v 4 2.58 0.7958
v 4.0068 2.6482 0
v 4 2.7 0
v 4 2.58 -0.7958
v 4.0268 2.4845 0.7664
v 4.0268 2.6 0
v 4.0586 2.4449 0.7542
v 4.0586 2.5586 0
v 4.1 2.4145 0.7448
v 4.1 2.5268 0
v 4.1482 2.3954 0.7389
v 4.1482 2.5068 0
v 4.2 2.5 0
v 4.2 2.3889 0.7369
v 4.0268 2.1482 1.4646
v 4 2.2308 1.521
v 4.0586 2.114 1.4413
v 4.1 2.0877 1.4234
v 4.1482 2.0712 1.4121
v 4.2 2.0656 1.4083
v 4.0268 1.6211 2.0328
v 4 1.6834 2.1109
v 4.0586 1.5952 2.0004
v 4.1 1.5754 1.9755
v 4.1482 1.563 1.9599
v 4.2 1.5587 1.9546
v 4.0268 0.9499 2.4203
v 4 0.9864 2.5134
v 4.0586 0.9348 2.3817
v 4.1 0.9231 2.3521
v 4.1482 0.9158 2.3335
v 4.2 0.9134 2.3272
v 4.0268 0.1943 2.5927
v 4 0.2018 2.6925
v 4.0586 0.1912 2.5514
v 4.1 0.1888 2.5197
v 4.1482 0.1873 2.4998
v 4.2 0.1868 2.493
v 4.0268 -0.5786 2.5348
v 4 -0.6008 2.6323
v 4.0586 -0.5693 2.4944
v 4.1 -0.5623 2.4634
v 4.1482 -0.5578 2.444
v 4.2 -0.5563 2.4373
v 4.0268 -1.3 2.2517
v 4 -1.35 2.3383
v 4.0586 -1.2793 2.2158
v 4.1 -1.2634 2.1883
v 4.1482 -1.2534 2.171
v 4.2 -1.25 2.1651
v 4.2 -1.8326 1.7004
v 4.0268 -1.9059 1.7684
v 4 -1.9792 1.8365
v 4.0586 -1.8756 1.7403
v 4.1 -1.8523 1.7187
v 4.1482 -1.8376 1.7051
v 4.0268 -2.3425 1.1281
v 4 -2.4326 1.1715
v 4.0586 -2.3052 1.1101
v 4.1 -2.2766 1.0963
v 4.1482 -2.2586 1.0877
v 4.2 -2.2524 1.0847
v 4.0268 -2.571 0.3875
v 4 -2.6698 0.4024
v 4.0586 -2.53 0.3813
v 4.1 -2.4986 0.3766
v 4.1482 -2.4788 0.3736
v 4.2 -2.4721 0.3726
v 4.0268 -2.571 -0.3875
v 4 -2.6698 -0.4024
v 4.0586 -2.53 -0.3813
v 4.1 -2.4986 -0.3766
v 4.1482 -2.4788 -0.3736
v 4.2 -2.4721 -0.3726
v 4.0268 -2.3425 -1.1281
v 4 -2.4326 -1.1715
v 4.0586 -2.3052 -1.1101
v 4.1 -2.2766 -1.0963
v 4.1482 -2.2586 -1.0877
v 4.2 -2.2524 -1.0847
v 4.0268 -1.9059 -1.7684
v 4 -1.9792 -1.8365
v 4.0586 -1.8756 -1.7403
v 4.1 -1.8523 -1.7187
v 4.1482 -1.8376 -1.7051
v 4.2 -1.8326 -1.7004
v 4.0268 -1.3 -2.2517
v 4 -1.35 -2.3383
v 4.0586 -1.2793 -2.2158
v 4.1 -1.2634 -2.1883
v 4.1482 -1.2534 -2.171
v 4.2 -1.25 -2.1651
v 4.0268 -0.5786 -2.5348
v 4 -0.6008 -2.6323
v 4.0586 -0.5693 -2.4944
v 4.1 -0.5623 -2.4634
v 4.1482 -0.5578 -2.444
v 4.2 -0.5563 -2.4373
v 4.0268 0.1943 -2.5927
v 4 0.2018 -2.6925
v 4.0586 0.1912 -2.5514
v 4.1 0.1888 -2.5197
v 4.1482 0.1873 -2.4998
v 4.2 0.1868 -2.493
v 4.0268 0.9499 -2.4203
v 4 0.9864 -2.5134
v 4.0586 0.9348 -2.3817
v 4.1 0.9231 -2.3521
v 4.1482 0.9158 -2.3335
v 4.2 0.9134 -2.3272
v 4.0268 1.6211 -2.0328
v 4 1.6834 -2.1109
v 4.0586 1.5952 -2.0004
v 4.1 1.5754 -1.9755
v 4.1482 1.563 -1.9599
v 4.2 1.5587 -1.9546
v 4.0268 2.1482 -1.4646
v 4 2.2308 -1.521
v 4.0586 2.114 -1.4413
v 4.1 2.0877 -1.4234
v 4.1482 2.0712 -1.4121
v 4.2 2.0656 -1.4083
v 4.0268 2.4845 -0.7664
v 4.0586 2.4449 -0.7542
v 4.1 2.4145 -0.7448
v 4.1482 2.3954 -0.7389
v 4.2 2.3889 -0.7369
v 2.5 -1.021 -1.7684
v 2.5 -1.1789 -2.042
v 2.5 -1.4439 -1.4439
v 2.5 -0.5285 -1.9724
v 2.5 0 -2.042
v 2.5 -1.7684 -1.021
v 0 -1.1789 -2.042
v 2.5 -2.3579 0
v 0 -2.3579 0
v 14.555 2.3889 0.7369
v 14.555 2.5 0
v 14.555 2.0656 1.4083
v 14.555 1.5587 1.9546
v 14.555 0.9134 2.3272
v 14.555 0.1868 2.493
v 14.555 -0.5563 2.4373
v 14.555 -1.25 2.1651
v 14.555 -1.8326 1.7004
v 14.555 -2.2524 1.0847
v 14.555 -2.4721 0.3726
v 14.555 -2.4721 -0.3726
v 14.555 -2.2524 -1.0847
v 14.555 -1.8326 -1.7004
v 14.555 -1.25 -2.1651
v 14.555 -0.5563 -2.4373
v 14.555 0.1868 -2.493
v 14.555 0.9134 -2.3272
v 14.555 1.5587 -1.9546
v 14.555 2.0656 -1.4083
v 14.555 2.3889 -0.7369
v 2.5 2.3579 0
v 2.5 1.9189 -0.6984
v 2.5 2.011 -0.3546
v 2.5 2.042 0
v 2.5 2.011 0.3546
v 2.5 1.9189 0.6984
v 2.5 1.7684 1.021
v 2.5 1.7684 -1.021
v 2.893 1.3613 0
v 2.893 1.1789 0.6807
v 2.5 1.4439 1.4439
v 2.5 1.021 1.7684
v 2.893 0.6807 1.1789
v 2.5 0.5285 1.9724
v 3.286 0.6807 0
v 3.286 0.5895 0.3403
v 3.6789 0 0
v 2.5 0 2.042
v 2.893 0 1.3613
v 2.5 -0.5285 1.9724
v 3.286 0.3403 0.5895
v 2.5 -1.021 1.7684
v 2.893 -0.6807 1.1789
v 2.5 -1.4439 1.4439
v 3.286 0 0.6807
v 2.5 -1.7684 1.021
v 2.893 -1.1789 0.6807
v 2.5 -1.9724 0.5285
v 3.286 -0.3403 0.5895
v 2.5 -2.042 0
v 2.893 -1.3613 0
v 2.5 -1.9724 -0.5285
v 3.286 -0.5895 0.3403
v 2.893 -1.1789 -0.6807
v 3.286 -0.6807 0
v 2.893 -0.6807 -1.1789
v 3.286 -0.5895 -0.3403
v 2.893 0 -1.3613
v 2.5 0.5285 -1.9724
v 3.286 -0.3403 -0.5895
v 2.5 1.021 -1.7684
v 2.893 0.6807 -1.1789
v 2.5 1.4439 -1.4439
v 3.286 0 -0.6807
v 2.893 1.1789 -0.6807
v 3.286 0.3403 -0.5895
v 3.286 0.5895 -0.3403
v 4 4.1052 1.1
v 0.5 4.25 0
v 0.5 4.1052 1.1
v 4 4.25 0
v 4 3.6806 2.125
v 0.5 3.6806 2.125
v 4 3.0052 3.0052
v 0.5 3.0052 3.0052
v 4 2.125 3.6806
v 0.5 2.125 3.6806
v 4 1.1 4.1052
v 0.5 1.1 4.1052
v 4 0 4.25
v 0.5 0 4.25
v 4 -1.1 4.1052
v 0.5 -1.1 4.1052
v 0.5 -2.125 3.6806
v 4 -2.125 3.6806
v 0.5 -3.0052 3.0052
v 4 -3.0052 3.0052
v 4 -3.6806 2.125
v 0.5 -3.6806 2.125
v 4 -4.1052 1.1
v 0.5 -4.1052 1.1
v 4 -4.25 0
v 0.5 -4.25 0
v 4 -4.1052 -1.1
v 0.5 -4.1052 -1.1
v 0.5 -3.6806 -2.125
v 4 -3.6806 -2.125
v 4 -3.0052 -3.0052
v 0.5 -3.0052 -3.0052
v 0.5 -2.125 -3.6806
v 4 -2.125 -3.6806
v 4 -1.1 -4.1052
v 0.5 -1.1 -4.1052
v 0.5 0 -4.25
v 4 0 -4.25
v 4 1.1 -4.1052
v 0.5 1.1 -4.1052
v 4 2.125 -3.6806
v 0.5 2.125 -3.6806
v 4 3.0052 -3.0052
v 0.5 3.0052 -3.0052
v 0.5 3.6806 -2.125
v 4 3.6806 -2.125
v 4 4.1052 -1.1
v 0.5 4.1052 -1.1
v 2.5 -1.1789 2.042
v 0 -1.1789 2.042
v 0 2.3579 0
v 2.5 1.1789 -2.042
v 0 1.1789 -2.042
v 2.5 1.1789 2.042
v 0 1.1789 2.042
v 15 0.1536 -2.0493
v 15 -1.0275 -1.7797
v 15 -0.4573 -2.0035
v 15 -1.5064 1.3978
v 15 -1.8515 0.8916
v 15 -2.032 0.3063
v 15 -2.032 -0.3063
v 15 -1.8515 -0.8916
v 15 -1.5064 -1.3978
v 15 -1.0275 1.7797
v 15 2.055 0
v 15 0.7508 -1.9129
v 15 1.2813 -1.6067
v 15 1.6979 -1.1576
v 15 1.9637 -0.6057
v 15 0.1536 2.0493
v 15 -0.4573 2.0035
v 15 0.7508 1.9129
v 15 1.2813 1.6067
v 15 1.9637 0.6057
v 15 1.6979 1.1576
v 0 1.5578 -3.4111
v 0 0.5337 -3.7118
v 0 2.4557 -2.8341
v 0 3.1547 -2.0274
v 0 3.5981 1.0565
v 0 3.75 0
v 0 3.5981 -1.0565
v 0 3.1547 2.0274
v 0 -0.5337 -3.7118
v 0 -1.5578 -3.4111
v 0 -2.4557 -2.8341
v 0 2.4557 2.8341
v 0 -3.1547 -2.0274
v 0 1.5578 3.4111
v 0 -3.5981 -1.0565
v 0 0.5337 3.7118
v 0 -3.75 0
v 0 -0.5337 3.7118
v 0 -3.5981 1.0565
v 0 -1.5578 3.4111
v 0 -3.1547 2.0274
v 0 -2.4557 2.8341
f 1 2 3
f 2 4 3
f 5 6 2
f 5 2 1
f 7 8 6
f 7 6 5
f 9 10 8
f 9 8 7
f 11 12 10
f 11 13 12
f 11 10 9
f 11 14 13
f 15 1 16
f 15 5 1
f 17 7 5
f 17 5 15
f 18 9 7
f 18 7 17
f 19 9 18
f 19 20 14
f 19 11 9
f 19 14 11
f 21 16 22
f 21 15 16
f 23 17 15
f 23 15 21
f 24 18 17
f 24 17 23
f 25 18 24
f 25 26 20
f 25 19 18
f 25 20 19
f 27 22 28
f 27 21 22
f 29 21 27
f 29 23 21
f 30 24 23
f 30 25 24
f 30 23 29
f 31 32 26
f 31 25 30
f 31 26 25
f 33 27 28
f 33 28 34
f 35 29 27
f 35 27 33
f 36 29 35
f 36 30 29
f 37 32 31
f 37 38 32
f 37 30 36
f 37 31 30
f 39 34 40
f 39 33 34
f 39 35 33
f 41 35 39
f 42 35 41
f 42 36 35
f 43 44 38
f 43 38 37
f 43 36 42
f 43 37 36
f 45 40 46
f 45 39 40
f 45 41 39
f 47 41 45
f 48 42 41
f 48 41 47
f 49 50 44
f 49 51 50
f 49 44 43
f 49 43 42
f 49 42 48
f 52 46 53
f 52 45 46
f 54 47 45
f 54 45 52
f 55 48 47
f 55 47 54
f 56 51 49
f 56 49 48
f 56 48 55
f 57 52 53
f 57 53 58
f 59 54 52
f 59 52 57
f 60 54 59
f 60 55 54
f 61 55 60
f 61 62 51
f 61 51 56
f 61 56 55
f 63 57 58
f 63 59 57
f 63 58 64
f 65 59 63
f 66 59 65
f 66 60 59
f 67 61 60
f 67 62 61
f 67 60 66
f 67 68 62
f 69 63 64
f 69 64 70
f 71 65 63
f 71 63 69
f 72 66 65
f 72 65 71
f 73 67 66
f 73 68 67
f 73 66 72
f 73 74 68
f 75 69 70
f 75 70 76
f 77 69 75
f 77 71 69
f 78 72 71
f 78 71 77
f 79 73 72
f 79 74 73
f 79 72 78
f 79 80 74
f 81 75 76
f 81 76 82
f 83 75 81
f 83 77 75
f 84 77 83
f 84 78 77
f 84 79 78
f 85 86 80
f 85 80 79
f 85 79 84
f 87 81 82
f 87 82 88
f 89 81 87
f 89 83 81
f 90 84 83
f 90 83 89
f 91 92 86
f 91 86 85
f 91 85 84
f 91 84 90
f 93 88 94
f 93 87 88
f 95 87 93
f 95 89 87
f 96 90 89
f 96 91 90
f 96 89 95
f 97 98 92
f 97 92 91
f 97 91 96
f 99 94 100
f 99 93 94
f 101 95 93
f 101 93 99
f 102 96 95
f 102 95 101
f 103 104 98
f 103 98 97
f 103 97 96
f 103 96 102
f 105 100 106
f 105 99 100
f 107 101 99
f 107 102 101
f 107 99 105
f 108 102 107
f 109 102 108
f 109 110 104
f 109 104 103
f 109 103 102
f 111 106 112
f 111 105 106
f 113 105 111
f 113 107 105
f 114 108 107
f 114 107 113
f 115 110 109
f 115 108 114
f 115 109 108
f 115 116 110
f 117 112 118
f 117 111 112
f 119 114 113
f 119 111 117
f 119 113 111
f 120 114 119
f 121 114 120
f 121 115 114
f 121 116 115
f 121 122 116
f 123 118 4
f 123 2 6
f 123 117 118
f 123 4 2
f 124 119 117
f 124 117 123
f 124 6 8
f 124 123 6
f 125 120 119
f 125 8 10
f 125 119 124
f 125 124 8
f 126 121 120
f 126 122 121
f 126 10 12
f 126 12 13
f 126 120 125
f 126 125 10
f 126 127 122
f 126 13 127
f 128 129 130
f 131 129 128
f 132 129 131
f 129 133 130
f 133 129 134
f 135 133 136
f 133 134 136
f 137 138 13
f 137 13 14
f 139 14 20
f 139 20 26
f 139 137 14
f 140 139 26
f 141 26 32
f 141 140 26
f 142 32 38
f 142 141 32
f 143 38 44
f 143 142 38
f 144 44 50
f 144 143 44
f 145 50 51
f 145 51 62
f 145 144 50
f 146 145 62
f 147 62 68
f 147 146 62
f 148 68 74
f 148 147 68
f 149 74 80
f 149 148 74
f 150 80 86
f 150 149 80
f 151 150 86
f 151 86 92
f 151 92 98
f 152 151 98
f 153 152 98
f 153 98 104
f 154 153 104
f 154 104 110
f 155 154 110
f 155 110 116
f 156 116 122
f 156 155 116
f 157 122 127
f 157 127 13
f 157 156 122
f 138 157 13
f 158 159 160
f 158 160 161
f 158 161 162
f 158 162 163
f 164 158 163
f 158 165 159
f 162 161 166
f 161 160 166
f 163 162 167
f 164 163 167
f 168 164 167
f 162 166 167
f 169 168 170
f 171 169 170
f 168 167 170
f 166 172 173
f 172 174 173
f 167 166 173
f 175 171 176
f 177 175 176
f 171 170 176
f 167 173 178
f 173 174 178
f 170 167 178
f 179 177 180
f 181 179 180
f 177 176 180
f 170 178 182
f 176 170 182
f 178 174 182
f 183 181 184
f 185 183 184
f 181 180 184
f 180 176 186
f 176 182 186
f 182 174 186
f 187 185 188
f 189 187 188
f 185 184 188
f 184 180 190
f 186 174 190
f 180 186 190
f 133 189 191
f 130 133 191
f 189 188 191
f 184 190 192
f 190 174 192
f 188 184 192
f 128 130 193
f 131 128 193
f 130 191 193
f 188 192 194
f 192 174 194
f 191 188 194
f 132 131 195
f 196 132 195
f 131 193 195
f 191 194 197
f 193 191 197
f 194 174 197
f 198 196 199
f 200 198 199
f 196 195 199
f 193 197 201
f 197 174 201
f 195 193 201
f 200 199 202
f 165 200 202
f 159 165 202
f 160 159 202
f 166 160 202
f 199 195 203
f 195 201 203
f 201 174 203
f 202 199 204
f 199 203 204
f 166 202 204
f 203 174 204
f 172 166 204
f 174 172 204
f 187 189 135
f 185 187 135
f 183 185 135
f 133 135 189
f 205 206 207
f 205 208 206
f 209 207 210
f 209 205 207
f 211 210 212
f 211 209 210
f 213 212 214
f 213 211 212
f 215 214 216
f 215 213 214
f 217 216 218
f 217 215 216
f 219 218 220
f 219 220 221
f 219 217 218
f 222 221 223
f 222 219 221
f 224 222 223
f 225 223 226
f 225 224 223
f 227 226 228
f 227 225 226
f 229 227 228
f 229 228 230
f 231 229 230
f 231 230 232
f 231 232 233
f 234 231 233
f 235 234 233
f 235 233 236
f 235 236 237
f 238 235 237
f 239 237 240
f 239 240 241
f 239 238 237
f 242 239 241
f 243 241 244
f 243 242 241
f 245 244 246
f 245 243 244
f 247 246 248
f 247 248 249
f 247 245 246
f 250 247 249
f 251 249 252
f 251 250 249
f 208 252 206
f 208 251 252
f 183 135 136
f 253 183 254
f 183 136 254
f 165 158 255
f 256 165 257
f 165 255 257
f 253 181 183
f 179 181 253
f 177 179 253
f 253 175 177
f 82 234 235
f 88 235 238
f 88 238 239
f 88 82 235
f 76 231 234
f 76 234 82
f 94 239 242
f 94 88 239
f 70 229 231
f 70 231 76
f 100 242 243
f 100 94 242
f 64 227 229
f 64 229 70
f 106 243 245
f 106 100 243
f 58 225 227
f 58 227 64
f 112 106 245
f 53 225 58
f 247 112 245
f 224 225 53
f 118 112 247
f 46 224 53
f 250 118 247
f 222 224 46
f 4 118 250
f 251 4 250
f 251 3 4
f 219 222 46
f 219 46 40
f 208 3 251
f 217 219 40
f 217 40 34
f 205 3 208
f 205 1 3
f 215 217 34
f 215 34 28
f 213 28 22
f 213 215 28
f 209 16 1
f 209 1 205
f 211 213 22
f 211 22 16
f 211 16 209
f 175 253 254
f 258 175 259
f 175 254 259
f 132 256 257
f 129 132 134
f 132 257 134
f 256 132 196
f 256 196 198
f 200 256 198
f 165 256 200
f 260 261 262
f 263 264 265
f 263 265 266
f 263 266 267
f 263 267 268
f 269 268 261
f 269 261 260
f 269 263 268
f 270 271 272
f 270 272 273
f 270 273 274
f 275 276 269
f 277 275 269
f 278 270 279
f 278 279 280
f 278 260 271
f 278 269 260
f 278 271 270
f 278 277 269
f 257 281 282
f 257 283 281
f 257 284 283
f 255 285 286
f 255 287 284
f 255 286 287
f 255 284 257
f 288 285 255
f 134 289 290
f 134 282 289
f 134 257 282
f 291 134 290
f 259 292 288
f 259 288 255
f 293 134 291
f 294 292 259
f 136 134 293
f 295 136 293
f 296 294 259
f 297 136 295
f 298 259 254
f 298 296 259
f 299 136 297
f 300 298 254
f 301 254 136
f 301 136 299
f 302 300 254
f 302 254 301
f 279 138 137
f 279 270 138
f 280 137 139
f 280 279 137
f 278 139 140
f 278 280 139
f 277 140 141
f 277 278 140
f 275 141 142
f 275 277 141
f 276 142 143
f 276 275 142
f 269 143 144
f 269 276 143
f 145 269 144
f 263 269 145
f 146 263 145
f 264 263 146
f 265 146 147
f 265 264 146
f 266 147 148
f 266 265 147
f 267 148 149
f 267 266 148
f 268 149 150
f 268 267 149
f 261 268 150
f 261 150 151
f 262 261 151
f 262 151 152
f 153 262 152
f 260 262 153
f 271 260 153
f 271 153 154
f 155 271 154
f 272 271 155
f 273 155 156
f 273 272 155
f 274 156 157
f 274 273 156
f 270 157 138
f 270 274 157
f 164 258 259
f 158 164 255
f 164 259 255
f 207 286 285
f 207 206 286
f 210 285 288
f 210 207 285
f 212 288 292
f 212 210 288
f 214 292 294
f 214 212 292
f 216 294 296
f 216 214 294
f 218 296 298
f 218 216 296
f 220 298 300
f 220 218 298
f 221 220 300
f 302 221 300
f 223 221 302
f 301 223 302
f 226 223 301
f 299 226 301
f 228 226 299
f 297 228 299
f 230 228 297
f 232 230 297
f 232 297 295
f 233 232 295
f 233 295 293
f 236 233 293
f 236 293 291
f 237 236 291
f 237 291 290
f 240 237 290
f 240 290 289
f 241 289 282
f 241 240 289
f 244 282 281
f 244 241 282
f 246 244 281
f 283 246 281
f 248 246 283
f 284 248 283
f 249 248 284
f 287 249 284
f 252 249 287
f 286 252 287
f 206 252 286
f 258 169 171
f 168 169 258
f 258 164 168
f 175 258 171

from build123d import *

# Parameters (mm, degrees)
FILLET1_R   = 0.2
HEX_2_DEPTH = 2.5


with BuildPart() as part:
    # BodySke → Base-Revolve (revolve)
    with BuildSketch(Plane.XY):
        Polygon((0, 0), (0, 3.75), (0.5, 4.25), (4, 4.25), (4, 2.5), (14.555, 2.5), (15, 2.055), (15, 0), align=None)
    revolve(axis=Axis((-31.75, 0, 0), (1, 0, 0)))

    # Fillet1
    fillet1_edges = [part.edges().sort_by_distance(p)[0] for p in [
        (4, -2.5, 0),
    ]]
    fillet(fillet1_edges, radius=FILLET1_R)

    # Sketch2 → Hex-PreBroach (revolve, cut)
    with BuildSketch(Plane.XY):
        Polygon((0, 2.042), (2.5, 2.042), (3.67894925, 0), (0, 0), align=None)
    revolve(axis=Axis((0, 0, 0), (1, 0, 0)), mode=Mode.SUBTRACT)

    # Sketch3 → Hex 2 (cut)
    with BuildSketch(Plane(origin=(0, 0, 0), x_dir=(0, 0.5, 0.866025404), z_dir=(-1, 0, 0))):
        Polygon((1.17894925, 2.042), (-1.17894925, 2.042), (-2.357898499, 0), (-1.17894925, -2.042), (1.17894925, -2.042), (2.357898499, 0), align=None)
    extrude(amount=-HEX_2_DEPTH, mode=Mode.SUBTRACT)


solid = part.part
